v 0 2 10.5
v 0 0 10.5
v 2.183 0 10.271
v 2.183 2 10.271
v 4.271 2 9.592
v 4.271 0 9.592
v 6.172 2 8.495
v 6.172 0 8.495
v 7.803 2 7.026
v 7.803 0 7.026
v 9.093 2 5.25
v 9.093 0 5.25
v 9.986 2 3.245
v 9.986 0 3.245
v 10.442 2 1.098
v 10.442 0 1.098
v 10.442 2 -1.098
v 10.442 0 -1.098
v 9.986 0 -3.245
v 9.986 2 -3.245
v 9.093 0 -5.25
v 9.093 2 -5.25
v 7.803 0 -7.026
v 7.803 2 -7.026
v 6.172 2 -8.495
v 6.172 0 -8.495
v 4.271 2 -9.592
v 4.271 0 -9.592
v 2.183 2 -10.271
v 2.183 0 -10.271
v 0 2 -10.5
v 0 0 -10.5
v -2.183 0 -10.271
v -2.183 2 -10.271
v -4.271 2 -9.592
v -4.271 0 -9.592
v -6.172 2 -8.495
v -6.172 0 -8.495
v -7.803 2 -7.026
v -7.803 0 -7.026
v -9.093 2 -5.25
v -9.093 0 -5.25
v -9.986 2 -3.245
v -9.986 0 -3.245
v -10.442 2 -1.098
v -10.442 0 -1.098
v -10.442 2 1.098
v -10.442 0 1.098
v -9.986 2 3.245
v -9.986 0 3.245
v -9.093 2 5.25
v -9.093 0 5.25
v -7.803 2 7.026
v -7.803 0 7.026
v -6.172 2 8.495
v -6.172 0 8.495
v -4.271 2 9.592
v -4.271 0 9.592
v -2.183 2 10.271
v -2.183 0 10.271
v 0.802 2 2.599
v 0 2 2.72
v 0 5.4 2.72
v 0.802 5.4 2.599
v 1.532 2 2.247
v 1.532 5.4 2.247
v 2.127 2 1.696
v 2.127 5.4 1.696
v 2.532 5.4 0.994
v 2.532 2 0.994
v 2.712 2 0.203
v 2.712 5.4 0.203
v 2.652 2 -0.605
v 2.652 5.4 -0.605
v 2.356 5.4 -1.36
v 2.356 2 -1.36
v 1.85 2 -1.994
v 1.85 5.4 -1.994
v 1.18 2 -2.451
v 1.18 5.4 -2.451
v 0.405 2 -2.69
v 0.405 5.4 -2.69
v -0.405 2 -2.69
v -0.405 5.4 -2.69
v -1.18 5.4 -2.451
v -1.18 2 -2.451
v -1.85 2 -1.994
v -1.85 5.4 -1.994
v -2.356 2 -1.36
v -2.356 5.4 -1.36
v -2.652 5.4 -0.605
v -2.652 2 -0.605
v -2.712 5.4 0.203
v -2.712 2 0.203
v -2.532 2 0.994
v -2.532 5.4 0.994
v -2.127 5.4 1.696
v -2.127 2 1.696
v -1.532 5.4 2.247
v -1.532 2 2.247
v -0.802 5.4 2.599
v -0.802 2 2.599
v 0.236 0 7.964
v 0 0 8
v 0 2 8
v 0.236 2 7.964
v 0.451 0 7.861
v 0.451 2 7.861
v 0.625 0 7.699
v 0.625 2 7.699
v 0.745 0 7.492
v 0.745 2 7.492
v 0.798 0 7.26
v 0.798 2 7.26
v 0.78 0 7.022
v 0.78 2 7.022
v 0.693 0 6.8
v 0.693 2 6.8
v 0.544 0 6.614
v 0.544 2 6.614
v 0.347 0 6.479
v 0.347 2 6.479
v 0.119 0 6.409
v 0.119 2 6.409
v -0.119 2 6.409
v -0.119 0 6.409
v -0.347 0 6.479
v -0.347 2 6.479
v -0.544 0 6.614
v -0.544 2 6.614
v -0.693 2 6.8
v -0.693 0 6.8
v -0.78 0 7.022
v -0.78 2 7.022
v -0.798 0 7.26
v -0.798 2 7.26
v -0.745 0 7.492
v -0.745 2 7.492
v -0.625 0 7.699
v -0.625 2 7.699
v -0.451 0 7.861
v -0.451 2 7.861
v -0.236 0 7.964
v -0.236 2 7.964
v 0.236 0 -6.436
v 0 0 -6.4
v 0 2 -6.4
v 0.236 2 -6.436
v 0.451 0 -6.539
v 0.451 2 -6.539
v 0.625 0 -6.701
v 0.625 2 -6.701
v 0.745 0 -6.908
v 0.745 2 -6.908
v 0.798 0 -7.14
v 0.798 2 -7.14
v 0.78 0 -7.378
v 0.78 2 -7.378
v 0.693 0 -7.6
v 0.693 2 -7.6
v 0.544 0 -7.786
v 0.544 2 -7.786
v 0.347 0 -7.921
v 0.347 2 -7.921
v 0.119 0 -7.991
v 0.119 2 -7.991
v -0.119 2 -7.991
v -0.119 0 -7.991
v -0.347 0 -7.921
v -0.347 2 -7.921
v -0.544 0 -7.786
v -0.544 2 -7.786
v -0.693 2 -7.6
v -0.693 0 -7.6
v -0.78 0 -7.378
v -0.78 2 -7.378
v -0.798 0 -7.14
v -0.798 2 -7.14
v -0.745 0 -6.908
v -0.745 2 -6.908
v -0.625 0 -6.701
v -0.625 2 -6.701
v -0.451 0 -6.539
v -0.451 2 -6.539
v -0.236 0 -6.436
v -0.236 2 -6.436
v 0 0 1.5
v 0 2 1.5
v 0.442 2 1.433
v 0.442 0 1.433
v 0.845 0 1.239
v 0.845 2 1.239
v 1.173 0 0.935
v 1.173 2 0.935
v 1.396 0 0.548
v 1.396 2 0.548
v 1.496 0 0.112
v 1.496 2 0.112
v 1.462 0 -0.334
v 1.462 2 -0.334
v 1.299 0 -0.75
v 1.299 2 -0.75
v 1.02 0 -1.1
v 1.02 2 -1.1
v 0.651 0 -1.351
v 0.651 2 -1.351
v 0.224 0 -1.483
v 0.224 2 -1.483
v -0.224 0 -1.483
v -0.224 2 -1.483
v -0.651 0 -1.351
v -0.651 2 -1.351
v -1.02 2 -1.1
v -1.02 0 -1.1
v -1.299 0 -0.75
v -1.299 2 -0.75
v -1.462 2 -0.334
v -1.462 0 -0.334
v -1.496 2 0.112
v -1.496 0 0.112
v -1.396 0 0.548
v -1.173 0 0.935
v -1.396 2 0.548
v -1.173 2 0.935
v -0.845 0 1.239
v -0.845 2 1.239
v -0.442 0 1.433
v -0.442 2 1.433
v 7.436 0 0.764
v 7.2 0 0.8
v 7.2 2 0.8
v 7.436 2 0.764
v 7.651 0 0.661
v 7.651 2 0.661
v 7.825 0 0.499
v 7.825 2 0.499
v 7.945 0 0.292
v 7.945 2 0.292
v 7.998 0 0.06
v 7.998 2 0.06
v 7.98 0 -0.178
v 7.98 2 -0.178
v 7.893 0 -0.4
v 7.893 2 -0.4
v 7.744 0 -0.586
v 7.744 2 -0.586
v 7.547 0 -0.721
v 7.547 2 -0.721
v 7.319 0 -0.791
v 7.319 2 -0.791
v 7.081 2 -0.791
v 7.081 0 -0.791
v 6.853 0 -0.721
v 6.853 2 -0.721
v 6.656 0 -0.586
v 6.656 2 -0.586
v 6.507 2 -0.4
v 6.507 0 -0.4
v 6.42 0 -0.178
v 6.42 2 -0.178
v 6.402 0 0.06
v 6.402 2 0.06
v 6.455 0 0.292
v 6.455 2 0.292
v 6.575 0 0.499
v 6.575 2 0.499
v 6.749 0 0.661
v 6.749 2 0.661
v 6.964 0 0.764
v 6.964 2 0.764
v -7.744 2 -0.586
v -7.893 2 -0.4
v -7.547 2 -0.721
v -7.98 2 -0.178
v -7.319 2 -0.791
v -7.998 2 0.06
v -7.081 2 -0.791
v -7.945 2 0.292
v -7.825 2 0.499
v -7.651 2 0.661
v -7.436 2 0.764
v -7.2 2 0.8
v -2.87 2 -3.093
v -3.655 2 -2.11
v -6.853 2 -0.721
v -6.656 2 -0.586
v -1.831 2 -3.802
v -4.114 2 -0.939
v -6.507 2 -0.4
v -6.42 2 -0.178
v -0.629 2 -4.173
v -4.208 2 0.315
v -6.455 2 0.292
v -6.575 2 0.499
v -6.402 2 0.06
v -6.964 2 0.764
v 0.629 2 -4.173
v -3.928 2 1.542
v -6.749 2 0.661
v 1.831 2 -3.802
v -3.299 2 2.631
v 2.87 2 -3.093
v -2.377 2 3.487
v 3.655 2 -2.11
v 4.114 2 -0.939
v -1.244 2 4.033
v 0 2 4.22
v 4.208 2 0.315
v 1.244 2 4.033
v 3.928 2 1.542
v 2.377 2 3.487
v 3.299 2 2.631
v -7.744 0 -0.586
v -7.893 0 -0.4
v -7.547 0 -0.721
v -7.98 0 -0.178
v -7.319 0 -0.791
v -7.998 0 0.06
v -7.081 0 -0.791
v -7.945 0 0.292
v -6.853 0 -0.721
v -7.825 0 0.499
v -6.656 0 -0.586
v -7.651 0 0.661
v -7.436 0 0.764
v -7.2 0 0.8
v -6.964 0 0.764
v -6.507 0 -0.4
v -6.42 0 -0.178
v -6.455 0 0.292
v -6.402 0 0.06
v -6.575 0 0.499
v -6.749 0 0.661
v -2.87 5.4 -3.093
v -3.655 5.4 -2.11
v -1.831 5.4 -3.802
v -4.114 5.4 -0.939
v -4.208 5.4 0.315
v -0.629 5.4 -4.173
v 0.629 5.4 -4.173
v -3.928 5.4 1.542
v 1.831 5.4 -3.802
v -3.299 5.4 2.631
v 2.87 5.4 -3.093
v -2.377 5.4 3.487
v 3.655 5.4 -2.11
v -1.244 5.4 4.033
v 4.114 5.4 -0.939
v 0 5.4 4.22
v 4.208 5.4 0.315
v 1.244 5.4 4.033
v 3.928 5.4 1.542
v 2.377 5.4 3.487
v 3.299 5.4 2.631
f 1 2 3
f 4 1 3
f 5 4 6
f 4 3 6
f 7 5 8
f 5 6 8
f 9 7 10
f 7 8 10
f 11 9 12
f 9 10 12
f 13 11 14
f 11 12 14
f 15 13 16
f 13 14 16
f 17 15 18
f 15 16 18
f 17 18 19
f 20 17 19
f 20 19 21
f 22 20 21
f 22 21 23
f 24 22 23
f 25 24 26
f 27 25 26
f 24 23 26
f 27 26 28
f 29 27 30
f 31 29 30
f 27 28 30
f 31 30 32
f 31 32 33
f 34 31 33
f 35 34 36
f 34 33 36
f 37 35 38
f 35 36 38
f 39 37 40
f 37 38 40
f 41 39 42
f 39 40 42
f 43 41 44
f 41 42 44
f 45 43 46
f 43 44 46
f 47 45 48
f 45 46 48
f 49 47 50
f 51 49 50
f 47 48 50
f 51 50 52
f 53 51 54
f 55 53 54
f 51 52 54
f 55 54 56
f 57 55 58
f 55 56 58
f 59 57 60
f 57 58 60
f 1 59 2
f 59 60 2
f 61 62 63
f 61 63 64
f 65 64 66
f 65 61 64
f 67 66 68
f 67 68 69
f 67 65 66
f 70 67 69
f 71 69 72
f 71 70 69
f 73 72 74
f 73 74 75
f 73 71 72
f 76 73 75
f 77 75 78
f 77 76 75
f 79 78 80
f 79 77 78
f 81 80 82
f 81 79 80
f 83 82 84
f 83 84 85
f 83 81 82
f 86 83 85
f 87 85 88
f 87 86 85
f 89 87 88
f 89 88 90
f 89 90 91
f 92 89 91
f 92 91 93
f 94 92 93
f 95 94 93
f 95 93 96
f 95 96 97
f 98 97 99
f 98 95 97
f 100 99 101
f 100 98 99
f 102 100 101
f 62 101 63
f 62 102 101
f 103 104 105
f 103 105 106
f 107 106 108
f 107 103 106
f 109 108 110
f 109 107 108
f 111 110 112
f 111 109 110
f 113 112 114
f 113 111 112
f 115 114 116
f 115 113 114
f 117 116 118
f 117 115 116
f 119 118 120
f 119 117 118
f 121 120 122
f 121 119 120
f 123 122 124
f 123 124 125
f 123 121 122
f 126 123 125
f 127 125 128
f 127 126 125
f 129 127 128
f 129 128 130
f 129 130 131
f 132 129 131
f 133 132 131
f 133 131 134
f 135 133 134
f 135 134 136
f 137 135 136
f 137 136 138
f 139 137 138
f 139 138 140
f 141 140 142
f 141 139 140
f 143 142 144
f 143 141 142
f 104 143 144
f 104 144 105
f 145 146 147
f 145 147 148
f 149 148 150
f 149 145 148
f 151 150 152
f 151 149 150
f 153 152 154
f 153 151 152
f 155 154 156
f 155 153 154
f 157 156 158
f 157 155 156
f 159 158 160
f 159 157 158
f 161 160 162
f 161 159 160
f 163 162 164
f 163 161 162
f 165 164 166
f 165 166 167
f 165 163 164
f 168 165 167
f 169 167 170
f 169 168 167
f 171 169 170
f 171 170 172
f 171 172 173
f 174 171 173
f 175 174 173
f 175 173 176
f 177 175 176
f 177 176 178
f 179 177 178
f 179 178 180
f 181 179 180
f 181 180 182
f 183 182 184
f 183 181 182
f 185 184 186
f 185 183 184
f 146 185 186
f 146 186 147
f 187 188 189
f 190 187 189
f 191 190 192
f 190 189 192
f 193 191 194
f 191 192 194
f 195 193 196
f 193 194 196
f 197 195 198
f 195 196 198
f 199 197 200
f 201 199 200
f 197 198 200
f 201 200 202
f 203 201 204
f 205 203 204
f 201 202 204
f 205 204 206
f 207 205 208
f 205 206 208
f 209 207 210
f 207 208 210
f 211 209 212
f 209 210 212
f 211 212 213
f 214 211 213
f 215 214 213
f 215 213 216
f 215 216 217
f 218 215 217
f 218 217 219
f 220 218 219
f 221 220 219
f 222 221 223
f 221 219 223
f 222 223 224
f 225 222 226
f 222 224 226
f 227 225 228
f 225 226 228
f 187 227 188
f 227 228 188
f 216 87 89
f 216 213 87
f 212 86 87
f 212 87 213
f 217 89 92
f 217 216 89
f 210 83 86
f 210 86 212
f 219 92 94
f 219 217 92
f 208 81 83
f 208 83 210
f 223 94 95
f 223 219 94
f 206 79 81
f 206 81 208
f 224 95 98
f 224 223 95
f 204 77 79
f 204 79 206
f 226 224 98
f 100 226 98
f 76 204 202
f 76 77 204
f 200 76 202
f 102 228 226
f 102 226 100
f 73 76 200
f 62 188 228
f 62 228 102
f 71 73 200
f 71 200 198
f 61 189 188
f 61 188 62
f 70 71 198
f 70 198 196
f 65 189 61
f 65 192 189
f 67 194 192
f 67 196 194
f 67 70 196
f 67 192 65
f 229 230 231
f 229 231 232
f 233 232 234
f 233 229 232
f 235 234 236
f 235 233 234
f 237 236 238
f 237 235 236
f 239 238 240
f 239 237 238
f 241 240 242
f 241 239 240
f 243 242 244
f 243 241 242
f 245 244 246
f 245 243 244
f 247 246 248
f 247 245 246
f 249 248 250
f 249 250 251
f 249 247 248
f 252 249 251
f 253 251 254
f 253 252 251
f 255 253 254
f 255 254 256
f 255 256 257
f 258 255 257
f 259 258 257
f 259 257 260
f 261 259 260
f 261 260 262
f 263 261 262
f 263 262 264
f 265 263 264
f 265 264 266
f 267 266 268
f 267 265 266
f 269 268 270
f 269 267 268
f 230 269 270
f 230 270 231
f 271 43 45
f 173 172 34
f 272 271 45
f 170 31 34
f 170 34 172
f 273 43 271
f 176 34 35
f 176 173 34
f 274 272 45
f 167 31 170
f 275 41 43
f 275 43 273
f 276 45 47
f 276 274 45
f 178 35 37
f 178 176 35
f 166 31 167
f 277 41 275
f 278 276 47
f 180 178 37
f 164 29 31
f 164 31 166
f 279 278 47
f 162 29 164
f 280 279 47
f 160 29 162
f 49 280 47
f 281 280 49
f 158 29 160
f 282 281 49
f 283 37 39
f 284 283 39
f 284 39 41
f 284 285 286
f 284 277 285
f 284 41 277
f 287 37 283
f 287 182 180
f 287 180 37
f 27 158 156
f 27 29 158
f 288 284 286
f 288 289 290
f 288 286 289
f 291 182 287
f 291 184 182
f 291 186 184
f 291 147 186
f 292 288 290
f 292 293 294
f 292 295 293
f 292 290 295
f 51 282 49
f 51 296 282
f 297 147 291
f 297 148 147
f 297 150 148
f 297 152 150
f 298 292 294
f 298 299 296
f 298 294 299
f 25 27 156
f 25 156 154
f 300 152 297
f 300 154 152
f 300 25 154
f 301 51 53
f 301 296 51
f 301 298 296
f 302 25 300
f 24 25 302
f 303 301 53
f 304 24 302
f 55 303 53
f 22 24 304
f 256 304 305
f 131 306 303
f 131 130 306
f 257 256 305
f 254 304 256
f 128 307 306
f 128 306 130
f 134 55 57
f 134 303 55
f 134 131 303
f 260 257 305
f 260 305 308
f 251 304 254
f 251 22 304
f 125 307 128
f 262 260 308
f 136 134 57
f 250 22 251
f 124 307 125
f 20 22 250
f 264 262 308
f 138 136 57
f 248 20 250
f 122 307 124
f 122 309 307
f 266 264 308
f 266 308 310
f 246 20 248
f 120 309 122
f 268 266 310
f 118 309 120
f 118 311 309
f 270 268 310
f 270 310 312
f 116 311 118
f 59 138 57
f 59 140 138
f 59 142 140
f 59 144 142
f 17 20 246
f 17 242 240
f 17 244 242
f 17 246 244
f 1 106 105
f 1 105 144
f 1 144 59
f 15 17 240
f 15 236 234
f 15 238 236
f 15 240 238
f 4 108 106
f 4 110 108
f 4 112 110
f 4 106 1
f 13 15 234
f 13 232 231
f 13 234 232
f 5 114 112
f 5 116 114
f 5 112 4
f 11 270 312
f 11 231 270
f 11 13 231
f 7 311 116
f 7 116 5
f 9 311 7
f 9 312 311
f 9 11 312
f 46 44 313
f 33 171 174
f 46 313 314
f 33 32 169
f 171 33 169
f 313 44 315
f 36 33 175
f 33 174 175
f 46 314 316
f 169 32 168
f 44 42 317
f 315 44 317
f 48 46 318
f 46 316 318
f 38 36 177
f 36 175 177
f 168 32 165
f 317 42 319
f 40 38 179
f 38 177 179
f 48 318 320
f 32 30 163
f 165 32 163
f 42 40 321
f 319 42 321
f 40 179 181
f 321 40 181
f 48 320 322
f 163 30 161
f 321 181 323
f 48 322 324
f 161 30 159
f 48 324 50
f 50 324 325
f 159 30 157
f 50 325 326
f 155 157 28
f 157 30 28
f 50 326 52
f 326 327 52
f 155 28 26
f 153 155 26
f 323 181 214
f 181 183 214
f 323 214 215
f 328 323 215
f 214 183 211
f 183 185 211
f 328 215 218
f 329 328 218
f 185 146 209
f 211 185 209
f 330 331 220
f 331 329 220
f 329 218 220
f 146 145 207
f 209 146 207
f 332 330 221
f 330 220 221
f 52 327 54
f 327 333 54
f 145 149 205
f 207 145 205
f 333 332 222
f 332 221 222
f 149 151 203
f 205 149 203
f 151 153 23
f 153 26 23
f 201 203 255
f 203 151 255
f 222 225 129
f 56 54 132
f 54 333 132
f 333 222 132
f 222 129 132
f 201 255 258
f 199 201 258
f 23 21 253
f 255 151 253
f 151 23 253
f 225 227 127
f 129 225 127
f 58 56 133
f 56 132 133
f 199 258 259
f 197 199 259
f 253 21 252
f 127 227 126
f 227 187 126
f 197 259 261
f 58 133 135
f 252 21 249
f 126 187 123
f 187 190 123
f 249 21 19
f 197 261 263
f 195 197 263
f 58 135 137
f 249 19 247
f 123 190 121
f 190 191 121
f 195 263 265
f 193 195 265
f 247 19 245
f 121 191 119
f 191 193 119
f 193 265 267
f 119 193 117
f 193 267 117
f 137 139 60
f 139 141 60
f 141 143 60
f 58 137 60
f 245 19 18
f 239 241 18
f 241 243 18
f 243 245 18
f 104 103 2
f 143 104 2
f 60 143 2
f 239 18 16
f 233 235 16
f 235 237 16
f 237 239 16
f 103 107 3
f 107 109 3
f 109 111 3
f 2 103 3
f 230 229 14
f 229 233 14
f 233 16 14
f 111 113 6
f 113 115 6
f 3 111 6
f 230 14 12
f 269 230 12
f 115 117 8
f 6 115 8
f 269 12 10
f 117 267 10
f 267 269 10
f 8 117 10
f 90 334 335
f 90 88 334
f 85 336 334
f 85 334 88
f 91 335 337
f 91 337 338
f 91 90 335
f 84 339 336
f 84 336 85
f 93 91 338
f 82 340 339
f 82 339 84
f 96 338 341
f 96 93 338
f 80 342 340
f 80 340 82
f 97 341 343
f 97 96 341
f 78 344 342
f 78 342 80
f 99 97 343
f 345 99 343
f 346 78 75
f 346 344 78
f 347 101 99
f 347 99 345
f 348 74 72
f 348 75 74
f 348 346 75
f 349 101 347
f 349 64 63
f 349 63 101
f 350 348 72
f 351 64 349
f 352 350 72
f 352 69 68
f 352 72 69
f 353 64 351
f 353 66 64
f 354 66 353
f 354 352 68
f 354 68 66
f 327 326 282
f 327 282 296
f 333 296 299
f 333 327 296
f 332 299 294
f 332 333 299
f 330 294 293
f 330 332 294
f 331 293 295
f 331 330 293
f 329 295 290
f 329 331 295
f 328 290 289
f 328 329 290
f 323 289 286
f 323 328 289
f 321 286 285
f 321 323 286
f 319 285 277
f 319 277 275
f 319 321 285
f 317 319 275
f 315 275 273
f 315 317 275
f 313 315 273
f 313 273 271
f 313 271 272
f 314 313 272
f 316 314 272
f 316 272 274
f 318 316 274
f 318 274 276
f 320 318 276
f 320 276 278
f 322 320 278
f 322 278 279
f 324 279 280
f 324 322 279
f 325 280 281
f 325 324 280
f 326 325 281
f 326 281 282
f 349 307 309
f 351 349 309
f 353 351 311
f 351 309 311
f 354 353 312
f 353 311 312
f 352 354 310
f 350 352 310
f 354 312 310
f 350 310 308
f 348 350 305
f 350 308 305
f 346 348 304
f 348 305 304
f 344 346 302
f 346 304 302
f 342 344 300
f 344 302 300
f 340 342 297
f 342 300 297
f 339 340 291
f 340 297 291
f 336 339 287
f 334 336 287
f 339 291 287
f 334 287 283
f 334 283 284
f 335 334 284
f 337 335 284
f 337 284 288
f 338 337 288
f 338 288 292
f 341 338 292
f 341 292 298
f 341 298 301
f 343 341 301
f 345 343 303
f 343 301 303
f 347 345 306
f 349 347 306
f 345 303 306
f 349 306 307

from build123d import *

# Parameters (mm, degrees)
SKETCH1_R           = 10.5
SKETCH1_R_2         = 0.8
BOSS_EXTRUDE1_DEPTH = 2
SKETCH2_R           = 1.5
CUT_EXTRUDE1_DEPTH  = 2
SKETCH2_3_R         = 4.22
SKETCH2_3_R_2       = 2.72
BOSS_EXTRUDE2_DEPTH = 3.4


with BuildPart() as part:
    # Sketch1 → Boss-Extrude1 (new body)
    with BuildSketch(Plane(origin=(0, 0, 0), x_dir=(1, 0, 0), z_dir=(0, 1, 0))):
        Circle(SKETCH1_R)
        with Locations((0, 7.2)):
            Circle(SKETCH1_R_2, mode=Mode.SUBTRACT)
        with Locations((7.2, 0)):
            Circle(SKETCH1_R_2, mode=Mode.SUBTRACT)
        with Locations((0, -7.2)):
            Circle(SKETCH1_R_2, mode=Mode.SUBTRACT)
        with Locations((-7.2, 0)):
            Circle(SKETCH1_R_2, mode=Mode.SUBTRACT)
    extrude(amount=BOSS_EXTRUDE1_DEPTH)

    # Sketch2 → Cut-Extrude1 (cut)
    with BuildSketch(Plane(origin=(0, 2, 0), x_dir=(1, 0, 0), z_dir=(0, 1, 0))):
        Circle(SKETCH2_R)
    extrude(amount=-CUT_EXTRUDE1_DEPTH, mode=Mode.SUBTRACT)

    # Sketch2<3> → Boss-Extrude2 (add)
    with BuildSketch(Plane(origin=(0, 2, 0), x_dir=(1, 0, 0), z_dir=(0, 1, 0))):
        Circle(SKETCH2_3_R)
        Circle(SKETCH2_3_R_2, mode=Mode.SUBTRACT)
    extrude(amount=BOSS_EXTRUDE2_DEPTH)


solid = part.part
